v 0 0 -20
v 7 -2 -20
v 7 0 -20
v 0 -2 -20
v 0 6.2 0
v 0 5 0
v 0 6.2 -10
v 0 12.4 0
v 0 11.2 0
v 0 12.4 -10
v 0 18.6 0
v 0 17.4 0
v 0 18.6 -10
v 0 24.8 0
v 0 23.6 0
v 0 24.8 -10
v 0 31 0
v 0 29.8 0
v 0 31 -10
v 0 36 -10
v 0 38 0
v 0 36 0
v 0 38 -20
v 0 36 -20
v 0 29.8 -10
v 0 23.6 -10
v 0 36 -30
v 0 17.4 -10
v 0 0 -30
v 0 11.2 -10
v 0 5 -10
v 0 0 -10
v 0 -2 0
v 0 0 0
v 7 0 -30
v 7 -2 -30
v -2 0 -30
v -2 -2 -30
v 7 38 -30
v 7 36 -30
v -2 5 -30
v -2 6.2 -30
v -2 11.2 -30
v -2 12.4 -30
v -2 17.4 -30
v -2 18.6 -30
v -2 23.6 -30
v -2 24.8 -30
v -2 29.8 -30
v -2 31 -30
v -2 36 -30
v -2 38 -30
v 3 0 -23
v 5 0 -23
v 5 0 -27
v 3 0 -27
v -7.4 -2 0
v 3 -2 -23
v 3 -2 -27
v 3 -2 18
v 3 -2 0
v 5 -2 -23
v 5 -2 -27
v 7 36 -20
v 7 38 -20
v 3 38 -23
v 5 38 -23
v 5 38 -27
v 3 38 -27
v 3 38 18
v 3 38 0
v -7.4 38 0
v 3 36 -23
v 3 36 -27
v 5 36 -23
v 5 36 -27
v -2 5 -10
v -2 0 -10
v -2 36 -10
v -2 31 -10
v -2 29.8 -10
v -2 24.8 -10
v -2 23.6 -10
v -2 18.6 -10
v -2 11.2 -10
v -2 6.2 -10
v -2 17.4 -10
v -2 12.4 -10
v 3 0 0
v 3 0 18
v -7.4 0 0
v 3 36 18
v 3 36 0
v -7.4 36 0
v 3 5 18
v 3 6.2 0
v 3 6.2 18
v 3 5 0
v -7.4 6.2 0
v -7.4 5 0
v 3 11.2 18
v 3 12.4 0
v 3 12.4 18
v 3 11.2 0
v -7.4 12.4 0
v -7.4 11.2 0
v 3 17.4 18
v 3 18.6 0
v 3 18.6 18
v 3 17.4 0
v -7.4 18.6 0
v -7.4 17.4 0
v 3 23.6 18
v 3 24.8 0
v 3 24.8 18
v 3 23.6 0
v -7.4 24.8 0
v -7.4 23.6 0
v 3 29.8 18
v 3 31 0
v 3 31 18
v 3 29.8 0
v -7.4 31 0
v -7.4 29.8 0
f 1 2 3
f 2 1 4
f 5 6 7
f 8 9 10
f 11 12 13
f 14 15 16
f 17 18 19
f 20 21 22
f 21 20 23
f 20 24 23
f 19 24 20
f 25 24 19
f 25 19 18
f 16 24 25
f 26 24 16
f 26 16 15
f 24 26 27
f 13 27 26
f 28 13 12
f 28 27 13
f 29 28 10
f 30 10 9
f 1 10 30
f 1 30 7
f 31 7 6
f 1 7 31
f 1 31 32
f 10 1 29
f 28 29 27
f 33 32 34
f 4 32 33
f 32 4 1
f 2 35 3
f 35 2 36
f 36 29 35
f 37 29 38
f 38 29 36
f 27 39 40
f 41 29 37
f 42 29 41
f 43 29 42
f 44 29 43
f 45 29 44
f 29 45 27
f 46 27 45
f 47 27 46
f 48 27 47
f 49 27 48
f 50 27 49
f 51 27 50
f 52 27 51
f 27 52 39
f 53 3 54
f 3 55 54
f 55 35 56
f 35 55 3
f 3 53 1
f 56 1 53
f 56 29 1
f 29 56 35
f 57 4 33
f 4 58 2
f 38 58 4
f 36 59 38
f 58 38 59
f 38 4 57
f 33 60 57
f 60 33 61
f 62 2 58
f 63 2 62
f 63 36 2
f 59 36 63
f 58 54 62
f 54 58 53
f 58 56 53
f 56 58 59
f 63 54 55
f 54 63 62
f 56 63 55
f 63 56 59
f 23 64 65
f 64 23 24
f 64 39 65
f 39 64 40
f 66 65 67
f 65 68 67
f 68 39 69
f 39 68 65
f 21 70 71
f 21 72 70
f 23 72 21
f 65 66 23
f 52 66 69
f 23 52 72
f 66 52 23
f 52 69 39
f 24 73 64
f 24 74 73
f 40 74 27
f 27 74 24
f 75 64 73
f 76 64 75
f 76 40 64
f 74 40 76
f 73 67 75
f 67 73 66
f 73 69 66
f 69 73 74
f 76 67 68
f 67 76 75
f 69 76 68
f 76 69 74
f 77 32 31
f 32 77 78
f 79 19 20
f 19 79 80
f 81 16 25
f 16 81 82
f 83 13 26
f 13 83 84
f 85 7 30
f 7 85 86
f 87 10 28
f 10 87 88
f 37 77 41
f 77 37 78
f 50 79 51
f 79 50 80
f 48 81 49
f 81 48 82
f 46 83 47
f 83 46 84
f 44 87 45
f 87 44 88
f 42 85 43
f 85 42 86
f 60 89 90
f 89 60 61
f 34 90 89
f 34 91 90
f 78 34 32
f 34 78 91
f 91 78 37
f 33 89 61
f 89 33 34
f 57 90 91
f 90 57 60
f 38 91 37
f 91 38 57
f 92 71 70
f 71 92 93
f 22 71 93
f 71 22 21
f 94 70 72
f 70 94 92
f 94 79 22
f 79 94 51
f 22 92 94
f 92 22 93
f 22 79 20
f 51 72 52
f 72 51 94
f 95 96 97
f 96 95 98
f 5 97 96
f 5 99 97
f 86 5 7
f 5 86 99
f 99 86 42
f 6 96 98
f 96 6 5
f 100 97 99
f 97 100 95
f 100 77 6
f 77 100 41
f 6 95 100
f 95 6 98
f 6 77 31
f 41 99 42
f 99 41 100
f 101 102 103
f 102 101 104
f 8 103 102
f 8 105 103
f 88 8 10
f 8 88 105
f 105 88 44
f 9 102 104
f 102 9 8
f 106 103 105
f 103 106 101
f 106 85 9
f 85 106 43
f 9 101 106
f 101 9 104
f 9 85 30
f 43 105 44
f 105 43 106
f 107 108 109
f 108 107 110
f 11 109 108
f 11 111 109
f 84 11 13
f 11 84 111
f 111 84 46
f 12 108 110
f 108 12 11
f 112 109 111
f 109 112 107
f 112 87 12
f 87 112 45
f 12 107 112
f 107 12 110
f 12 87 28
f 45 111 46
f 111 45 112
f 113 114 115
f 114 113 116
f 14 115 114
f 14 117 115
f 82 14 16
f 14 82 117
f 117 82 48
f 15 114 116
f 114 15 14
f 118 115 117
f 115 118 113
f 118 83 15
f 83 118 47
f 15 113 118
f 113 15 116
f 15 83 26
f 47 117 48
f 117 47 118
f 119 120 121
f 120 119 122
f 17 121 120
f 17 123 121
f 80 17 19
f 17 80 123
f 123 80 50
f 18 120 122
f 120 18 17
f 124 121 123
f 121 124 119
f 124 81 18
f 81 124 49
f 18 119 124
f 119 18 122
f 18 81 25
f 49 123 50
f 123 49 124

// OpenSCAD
//9 mm clipper 
//https://www.calculator.net/right-triangle-calculator.html?av=&alphav=30&alphaunit=d&bv=&betav=&betaunit=d&cv=&hv=9&areav=&perimeterv=&x=57&y=22


// 20 mm - 10 mm
// 10 mm (7mm height)



module prism(l, w, h){
   polyhedron(
    points=[[0,0,0], [l,0,0], [l,w,0], [0,w,0], [0,w,h], [l,w,h]],
    faces=[[0,1,2,3],[5,4,3,2],[0,4,5,1],[0,3,4],[5,2,1]]
   );
}

module spacer_9mm(wall){
    rear_length=30;
    rear_offset_z=2;
    translate([0,-wall,0]){
        // front triangle
        translate([18,0,-3])
            rotate([0,0,90])
                prism(wall,18,10.4);

        //rear triangle
        translate([-rear_length,wall,rear_offset_z])
        {
            rotate([0,0,-90])
                prism(wall,rear_length,5.4);
        }
         //fill in for rear triangle
        translate([-rear_length,0,0])
        {
            cube(size=[rear_length,wall,rear_offset_z]);
        }
    }
}

module mount_hole() {
    height = 7;
    width = 10;
    wall = 2;
    offset_x = 30;
    
    translate([-offset_x,0,-height]){
        difference(){
            cube(size=[width,wall,height]);
            // cutout w:4 h:2, 2mm from edge
            translate([3,0,2])
                cube(size=[4,wall,2]);
        }
    }
}

module mount_plate(clipper_width){
    center_width =20;
    wall = 2;
    offset_x = 30;

    //center piece
    translate([-offset_x,-wall,0])
        cube(size=[center_width,clipper_width+2*wall,wall]);
    //one mount
    translate([0, -wall, 0]){
        mount_hole();
    }
    //other mount
    translate([0, clipper_width,  0]) {
        mount_hole();
    }
    
}

width = 36;

rotate([0,-90,0]) {
    mount_plate(width);
    spacer_9mm(2);

    translate([0, width + 2,  0]) {
        spacer_9mm(2);
    }

    for (i=[1:5]){
        translate([0, i*6.2, 0])
            spacer_9mm(1.2);
    }
}
